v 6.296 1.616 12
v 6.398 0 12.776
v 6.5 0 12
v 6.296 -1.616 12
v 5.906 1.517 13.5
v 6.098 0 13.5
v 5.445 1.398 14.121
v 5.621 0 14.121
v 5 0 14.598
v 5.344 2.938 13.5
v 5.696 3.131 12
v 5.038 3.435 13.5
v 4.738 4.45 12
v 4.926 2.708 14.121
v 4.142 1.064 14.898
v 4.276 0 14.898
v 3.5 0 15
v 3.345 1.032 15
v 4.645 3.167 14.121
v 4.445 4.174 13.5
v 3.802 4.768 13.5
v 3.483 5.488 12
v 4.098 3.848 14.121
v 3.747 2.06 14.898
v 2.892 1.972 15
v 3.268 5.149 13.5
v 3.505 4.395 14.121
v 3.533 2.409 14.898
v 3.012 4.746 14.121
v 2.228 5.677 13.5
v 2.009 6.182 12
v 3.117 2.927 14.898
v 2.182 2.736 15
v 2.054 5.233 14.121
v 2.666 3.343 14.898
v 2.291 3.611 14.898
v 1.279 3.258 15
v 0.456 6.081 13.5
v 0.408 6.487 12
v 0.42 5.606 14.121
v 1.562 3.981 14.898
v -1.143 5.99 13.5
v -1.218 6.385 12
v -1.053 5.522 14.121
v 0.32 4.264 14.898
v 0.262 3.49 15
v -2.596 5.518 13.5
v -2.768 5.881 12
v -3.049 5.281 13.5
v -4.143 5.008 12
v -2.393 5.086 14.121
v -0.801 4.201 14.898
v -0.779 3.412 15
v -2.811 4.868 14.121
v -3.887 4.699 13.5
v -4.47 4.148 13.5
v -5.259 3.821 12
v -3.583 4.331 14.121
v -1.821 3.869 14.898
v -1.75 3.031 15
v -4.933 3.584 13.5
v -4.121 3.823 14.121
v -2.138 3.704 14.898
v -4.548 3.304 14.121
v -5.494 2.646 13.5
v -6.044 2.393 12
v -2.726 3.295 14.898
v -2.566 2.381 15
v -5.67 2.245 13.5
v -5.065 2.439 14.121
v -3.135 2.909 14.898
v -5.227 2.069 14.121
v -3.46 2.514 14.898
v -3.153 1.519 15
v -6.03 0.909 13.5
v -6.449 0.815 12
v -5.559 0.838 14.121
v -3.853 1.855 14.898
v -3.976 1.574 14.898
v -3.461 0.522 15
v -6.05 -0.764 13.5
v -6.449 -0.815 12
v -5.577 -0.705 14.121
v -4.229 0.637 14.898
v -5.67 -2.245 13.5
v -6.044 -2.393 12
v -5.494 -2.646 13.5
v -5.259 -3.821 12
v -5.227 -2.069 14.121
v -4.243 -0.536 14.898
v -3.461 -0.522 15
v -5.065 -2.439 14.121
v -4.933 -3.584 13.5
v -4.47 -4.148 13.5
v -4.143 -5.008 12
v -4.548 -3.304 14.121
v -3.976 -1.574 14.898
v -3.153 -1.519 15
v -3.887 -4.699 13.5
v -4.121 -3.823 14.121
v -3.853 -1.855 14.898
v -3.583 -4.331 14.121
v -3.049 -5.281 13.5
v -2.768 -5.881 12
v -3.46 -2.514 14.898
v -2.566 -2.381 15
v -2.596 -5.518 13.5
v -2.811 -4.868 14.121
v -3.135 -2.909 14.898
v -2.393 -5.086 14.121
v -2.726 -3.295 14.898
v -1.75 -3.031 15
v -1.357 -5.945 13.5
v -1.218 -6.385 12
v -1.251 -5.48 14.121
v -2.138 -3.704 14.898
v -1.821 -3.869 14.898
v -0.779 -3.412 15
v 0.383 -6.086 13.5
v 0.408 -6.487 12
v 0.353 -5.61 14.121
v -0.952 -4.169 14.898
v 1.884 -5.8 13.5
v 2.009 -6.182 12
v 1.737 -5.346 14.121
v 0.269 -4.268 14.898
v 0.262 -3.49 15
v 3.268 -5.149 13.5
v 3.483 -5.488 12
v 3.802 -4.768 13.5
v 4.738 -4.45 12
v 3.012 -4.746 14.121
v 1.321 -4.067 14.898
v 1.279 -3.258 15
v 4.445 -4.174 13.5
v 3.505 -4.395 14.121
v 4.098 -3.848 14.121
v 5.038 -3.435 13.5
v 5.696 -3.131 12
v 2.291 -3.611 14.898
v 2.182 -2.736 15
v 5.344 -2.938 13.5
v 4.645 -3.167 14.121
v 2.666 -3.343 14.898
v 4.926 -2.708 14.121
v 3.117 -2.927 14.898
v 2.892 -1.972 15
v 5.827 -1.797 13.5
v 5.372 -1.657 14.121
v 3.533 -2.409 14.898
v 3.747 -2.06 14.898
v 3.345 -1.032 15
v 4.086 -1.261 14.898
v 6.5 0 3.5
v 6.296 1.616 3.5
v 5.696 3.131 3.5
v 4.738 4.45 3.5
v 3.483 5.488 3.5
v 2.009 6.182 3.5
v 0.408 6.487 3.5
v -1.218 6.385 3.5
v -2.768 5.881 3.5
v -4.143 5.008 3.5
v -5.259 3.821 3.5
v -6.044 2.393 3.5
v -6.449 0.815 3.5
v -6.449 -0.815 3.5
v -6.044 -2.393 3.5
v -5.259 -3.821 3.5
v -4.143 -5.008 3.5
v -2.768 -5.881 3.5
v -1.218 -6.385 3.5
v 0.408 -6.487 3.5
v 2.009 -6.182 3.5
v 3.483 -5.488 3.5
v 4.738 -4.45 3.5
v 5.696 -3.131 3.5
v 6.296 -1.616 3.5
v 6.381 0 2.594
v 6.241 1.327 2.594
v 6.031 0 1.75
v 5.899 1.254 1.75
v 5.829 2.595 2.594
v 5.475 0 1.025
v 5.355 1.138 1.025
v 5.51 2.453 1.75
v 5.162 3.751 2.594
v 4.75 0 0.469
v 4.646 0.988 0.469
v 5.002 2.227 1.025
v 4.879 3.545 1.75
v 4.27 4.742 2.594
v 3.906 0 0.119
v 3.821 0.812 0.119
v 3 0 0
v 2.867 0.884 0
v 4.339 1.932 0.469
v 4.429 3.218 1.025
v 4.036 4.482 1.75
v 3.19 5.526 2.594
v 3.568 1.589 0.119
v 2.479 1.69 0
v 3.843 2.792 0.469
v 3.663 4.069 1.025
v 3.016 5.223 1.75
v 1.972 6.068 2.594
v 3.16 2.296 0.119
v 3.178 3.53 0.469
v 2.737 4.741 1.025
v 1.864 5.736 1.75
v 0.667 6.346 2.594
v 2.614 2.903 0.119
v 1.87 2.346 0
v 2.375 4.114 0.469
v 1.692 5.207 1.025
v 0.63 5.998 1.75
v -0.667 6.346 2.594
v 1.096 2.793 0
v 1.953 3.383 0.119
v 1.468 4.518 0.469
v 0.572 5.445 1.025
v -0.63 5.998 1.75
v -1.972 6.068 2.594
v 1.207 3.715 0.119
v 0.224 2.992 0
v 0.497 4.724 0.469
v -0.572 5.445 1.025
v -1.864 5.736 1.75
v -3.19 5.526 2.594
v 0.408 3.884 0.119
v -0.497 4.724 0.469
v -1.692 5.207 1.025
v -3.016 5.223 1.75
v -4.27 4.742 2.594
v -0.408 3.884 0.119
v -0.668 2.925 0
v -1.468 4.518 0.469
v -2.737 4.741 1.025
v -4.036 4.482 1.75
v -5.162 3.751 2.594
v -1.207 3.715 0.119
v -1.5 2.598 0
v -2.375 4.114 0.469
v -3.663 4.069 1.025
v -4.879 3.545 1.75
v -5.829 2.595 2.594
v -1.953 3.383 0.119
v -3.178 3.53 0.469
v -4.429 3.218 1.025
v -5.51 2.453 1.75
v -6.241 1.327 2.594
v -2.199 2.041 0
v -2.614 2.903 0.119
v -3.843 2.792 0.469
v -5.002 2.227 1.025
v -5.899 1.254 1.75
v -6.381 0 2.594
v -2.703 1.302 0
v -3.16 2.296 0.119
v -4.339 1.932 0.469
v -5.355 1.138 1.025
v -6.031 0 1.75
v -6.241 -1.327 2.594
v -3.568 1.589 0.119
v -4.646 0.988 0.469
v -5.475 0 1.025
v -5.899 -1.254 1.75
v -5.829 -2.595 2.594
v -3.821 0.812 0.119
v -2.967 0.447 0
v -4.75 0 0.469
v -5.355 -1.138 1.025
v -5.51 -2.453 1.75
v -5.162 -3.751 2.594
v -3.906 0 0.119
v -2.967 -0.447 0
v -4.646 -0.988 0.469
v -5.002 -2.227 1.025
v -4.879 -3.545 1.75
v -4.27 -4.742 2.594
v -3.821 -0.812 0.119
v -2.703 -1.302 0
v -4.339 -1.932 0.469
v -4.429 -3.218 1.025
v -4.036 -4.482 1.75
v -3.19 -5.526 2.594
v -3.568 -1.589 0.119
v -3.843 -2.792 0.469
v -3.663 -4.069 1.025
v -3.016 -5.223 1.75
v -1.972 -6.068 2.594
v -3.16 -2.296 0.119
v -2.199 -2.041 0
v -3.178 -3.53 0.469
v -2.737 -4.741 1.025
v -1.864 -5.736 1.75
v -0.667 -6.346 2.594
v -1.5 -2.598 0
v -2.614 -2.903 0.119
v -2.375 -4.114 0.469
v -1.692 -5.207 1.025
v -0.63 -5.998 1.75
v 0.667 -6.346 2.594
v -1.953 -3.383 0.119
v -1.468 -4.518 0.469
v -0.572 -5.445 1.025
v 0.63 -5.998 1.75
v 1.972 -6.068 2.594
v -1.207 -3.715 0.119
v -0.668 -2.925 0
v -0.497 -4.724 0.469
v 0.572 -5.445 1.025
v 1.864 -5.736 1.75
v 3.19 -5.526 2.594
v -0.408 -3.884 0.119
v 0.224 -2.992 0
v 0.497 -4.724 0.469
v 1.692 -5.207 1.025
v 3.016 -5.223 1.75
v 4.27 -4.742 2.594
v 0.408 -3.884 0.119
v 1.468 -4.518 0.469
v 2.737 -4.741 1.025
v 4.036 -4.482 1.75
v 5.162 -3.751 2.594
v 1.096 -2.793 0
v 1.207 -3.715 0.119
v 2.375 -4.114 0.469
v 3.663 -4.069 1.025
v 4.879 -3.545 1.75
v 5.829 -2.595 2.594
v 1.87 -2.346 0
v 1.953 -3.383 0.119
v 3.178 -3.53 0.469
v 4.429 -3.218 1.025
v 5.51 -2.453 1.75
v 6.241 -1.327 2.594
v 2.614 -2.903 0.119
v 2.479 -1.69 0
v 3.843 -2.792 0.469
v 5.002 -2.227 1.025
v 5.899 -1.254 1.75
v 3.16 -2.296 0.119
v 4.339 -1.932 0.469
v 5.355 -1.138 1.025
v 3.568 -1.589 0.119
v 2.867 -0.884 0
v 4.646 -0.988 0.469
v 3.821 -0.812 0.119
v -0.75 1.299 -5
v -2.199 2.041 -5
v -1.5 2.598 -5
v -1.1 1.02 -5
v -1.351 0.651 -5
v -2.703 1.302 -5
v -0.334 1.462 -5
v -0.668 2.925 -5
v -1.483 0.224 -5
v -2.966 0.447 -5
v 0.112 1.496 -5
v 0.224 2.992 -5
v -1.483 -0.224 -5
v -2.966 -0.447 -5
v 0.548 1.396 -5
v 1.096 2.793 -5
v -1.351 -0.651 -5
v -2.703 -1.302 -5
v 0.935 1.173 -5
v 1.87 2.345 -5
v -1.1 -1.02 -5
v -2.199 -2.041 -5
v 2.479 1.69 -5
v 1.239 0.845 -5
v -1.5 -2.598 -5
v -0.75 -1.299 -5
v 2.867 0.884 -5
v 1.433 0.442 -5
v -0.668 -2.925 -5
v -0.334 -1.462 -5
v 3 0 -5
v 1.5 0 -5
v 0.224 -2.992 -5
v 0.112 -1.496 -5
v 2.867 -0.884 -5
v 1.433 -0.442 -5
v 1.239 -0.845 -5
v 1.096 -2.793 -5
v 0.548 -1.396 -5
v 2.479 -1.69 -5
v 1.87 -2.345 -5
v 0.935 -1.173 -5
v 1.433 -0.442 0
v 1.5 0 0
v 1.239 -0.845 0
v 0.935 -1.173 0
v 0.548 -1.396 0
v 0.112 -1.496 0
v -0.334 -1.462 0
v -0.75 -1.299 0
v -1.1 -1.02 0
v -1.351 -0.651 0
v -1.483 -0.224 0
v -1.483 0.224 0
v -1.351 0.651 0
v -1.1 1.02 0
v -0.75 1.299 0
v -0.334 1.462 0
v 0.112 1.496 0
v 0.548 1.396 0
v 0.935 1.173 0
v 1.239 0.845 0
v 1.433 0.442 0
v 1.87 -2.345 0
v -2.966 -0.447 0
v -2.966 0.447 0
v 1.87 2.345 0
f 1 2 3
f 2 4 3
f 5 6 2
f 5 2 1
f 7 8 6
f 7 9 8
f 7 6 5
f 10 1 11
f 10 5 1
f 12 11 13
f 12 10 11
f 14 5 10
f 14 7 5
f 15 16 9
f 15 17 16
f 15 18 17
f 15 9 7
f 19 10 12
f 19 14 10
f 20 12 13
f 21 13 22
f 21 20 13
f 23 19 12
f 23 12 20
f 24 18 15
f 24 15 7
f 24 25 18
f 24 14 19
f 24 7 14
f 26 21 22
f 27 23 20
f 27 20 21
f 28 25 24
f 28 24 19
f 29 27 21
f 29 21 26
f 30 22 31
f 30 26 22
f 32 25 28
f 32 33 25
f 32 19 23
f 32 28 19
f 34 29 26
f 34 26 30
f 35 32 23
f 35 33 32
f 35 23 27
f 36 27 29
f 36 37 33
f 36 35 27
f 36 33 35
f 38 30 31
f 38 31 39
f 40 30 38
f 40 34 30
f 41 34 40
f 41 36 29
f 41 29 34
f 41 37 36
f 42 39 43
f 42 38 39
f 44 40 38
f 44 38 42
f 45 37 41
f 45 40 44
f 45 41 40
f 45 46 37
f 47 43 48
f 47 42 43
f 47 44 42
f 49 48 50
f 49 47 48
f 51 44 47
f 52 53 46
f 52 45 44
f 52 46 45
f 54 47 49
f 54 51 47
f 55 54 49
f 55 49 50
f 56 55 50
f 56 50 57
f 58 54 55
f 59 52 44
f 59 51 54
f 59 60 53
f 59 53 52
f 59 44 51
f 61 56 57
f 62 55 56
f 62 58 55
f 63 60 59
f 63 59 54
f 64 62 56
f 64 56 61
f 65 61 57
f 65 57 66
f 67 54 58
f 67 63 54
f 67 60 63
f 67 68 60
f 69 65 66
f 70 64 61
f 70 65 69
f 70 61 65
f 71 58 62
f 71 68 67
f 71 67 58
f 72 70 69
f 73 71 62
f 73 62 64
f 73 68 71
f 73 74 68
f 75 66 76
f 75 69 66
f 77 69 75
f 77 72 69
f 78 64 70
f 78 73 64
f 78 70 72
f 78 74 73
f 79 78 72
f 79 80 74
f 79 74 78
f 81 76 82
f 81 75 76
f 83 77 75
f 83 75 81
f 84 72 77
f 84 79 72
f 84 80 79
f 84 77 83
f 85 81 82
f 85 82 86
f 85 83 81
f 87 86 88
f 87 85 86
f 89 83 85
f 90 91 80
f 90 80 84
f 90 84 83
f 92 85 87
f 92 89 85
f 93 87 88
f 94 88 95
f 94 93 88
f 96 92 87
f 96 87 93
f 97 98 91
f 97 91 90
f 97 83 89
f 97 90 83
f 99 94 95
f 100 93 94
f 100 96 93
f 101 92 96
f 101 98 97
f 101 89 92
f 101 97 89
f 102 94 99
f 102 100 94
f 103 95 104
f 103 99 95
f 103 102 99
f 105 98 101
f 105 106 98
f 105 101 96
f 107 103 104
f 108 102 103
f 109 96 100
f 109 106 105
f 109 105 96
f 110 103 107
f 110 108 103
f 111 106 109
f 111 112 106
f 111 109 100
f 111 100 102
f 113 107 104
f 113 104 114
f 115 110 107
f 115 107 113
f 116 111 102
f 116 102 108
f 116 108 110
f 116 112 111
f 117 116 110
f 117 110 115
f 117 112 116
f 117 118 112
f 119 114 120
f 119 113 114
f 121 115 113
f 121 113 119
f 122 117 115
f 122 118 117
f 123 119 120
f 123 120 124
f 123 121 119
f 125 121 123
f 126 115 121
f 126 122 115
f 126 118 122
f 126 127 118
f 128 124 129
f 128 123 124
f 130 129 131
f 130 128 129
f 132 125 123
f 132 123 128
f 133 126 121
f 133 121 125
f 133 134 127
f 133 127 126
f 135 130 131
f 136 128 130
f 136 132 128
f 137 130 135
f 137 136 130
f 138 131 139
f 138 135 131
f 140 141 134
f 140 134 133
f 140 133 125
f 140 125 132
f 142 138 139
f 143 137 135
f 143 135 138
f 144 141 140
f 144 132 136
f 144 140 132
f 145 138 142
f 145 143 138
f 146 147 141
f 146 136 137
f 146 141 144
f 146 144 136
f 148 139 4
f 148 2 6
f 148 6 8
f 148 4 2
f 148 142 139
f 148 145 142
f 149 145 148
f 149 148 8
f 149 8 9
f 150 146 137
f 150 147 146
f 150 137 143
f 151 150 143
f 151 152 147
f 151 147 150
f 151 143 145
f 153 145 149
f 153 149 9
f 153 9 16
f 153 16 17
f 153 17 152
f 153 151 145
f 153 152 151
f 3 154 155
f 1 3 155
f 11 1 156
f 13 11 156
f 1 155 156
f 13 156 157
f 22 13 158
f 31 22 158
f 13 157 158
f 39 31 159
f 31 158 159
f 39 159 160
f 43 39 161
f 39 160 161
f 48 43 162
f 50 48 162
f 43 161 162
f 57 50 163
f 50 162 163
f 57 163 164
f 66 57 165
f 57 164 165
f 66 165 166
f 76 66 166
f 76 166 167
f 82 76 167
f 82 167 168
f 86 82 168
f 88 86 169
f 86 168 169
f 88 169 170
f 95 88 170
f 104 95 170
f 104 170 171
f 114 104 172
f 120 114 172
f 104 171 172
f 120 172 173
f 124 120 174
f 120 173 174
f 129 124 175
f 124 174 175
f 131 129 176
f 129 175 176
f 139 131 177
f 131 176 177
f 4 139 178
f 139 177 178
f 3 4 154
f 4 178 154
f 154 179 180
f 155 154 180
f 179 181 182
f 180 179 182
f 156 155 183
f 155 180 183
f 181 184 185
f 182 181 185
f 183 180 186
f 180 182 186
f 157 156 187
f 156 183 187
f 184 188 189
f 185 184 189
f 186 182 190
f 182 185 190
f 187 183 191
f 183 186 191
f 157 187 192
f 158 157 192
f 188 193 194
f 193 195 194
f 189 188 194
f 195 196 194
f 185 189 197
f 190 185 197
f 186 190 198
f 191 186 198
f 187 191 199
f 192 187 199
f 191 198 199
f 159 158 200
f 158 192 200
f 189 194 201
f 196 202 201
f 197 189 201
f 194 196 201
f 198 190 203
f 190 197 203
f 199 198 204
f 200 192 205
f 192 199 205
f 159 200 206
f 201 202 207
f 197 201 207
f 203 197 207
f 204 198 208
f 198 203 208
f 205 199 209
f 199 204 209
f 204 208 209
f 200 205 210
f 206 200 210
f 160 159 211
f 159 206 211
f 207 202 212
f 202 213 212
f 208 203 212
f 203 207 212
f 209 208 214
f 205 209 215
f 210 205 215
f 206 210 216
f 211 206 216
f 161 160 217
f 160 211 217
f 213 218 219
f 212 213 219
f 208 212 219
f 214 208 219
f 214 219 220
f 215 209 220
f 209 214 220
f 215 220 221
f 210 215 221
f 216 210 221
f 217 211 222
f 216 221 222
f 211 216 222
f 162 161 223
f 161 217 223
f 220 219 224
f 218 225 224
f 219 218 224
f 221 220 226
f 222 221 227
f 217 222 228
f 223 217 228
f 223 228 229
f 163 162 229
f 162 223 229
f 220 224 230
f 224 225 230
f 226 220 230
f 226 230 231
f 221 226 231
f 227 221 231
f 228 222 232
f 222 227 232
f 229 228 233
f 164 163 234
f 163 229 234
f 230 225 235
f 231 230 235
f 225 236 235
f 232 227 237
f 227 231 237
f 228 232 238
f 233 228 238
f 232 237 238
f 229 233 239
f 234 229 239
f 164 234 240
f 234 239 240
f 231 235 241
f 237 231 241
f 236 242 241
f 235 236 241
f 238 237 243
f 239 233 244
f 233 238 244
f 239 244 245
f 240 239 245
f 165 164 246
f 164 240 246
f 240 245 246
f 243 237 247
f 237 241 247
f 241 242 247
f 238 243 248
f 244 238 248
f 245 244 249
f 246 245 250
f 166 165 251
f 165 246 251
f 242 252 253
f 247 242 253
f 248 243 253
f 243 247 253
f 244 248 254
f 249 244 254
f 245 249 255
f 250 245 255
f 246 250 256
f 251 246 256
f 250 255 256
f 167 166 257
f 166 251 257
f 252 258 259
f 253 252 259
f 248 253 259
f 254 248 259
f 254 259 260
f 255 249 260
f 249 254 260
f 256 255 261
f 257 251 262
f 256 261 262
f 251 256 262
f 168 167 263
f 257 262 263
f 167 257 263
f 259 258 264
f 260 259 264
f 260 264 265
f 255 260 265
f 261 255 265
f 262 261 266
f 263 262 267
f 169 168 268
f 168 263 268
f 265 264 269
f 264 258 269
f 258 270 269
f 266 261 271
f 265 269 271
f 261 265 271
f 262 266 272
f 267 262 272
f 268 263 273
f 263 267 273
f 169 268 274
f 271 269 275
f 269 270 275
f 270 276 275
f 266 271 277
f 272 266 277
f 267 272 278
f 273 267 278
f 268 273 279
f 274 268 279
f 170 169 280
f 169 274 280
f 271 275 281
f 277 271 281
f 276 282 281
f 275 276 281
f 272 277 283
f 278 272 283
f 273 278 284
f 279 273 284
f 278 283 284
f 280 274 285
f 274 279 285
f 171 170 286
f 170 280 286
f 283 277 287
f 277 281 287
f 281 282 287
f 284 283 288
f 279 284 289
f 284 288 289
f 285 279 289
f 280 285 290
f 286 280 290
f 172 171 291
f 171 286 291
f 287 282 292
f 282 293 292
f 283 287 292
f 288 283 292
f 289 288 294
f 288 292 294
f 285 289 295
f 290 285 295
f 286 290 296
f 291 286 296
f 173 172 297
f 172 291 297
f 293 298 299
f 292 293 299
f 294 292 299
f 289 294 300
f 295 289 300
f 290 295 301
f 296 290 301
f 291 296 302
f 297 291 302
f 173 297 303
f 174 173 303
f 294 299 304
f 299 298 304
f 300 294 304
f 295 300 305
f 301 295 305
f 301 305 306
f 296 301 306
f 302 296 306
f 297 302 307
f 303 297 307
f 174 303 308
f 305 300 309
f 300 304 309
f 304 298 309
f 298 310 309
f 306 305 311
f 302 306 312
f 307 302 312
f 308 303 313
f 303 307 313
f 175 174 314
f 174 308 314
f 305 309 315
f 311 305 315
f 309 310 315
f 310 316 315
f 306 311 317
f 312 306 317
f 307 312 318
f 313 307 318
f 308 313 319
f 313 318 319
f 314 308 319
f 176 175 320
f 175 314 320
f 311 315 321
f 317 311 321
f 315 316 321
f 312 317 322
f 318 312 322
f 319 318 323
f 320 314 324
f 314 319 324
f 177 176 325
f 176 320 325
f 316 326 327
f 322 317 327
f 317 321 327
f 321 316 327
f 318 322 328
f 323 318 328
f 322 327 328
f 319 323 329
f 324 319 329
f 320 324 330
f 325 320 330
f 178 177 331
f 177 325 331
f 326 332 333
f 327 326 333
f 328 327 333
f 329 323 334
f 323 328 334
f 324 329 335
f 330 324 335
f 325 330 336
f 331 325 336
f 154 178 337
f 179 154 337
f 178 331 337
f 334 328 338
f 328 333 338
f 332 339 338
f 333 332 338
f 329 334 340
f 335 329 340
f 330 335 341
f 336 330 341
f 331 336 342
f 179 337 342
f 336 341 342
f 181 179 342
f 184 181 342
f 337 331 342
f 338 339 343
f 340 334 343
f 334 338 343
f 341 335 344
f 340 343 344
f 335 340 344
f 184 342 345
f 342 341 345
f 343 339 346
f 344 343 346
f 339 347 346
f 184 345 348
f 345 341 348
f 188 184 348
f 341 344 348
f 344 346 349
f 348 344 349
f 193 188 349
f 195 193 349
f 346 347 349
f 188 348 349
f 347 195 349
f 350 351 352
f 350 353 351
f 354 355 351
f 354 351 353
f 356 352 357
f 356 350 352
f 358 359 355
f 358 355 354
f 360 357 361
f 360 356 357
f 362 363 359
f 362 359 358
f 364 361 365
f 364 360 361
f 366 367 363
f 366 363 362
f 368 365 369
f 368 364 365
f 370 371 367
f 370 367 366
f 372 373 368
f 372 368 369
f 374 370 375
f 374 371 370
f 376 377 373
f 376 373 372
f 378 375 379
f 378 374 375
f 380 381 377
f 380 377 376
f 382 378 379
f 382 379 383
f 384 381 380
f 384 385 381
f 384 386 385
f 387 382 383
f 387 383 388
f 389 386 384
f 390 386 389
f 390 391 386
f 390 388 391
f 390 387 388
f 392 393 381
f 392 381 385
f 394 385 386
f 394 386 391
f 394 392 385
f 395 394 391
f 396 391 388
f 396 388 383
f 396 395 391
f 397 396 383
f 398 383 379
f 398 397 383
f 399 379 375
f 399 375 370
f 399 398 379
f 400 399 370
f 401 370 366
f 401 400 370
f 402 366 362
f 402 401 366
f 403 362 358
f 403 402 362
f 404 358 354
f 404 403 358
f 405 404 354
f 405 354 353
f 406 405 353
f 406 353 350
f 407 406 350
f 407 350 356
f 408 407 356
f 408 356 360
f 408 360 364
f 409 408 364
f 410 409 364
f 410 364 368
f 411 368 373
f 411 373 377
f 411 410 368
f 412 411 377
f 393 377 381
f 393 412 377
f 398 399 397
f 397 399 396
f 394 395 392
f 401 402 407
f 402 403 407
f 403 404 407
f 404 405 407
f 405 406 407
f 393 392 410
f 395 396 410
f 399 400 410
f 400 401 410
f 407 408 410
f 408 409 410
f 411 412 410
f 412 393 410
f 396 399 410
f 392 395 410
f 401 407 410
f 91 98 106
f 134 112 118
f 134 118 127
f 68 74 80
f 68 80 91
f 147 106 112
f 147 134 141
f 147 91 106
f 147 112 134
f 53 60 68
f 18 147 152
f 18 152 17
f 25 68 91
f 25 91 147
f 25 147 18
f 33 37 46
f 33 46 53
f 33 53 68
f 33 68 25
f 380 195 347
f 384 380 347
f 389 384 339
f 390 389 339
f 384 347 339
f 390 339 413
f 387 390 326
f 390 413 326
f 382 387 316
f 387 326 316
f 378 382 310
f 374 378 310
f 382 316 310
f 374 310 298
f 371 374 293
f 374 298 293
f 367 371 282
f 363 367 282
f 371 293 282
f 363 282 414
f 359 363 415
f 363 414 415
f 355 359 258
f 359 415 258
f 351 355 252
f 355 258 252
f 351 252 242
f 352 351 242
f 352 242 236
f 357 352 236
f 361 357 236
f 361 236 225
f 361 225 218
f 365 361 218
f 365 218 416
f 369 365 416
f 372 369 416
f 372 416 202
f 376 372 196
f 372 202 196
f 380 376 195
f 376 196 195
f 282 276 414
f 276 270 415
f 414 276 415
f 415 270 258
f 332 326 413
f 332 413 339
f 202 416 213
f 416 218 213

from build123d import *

# Parameters (mm, degrees)
F0_R     = 6.5
F1_DEPTH = 15
F2_R     = 3
F2_R_2   = 1.5
F3_DEPTH = 5
F4_R     = 3.49999
F5_R     = 3


# Not quite as in the source:
# - a fillet or chamfer is up to 0.001 mm smaller than in the source, because OpenCascade refuses the exact size


with BuildPart() as f1:
    # F0 (on Top) → F1 (new body)
    with BuildSketch(Plane.XY):
        Circle(F0_R)
    extrude(amount=F1_DEPTH)

    # F2 (on face) → F3 (join)
    with BuildSketch(Plane(origin=(0, 0, 0), x_dir=(1, 0, 0), z_dir=(0, 0, -1))):
        Circle(F2_R)
        Circle(F2_R_2, mode=Mode.SUBTRACT)
    extrude(amount=F3_DEPTH)

    # F4 (radius 3.5 in the source; OpenCascade refuses exactly that, so slightly less here)
    f4_edges = [f1.edges().sort_by_distance(p)[0] for p in [
        (-6.5, 0, 0),
    ]]
    fillet(f4_edges, radius=F4_R)

    # F5
    f5_edges = [f1.edges().sort_by_distance(p)[0] for p in [
        (-6.5, 0, 15),
    ]]
    fillet(f5_edges, radius=F5_R)


solid = f1.part
